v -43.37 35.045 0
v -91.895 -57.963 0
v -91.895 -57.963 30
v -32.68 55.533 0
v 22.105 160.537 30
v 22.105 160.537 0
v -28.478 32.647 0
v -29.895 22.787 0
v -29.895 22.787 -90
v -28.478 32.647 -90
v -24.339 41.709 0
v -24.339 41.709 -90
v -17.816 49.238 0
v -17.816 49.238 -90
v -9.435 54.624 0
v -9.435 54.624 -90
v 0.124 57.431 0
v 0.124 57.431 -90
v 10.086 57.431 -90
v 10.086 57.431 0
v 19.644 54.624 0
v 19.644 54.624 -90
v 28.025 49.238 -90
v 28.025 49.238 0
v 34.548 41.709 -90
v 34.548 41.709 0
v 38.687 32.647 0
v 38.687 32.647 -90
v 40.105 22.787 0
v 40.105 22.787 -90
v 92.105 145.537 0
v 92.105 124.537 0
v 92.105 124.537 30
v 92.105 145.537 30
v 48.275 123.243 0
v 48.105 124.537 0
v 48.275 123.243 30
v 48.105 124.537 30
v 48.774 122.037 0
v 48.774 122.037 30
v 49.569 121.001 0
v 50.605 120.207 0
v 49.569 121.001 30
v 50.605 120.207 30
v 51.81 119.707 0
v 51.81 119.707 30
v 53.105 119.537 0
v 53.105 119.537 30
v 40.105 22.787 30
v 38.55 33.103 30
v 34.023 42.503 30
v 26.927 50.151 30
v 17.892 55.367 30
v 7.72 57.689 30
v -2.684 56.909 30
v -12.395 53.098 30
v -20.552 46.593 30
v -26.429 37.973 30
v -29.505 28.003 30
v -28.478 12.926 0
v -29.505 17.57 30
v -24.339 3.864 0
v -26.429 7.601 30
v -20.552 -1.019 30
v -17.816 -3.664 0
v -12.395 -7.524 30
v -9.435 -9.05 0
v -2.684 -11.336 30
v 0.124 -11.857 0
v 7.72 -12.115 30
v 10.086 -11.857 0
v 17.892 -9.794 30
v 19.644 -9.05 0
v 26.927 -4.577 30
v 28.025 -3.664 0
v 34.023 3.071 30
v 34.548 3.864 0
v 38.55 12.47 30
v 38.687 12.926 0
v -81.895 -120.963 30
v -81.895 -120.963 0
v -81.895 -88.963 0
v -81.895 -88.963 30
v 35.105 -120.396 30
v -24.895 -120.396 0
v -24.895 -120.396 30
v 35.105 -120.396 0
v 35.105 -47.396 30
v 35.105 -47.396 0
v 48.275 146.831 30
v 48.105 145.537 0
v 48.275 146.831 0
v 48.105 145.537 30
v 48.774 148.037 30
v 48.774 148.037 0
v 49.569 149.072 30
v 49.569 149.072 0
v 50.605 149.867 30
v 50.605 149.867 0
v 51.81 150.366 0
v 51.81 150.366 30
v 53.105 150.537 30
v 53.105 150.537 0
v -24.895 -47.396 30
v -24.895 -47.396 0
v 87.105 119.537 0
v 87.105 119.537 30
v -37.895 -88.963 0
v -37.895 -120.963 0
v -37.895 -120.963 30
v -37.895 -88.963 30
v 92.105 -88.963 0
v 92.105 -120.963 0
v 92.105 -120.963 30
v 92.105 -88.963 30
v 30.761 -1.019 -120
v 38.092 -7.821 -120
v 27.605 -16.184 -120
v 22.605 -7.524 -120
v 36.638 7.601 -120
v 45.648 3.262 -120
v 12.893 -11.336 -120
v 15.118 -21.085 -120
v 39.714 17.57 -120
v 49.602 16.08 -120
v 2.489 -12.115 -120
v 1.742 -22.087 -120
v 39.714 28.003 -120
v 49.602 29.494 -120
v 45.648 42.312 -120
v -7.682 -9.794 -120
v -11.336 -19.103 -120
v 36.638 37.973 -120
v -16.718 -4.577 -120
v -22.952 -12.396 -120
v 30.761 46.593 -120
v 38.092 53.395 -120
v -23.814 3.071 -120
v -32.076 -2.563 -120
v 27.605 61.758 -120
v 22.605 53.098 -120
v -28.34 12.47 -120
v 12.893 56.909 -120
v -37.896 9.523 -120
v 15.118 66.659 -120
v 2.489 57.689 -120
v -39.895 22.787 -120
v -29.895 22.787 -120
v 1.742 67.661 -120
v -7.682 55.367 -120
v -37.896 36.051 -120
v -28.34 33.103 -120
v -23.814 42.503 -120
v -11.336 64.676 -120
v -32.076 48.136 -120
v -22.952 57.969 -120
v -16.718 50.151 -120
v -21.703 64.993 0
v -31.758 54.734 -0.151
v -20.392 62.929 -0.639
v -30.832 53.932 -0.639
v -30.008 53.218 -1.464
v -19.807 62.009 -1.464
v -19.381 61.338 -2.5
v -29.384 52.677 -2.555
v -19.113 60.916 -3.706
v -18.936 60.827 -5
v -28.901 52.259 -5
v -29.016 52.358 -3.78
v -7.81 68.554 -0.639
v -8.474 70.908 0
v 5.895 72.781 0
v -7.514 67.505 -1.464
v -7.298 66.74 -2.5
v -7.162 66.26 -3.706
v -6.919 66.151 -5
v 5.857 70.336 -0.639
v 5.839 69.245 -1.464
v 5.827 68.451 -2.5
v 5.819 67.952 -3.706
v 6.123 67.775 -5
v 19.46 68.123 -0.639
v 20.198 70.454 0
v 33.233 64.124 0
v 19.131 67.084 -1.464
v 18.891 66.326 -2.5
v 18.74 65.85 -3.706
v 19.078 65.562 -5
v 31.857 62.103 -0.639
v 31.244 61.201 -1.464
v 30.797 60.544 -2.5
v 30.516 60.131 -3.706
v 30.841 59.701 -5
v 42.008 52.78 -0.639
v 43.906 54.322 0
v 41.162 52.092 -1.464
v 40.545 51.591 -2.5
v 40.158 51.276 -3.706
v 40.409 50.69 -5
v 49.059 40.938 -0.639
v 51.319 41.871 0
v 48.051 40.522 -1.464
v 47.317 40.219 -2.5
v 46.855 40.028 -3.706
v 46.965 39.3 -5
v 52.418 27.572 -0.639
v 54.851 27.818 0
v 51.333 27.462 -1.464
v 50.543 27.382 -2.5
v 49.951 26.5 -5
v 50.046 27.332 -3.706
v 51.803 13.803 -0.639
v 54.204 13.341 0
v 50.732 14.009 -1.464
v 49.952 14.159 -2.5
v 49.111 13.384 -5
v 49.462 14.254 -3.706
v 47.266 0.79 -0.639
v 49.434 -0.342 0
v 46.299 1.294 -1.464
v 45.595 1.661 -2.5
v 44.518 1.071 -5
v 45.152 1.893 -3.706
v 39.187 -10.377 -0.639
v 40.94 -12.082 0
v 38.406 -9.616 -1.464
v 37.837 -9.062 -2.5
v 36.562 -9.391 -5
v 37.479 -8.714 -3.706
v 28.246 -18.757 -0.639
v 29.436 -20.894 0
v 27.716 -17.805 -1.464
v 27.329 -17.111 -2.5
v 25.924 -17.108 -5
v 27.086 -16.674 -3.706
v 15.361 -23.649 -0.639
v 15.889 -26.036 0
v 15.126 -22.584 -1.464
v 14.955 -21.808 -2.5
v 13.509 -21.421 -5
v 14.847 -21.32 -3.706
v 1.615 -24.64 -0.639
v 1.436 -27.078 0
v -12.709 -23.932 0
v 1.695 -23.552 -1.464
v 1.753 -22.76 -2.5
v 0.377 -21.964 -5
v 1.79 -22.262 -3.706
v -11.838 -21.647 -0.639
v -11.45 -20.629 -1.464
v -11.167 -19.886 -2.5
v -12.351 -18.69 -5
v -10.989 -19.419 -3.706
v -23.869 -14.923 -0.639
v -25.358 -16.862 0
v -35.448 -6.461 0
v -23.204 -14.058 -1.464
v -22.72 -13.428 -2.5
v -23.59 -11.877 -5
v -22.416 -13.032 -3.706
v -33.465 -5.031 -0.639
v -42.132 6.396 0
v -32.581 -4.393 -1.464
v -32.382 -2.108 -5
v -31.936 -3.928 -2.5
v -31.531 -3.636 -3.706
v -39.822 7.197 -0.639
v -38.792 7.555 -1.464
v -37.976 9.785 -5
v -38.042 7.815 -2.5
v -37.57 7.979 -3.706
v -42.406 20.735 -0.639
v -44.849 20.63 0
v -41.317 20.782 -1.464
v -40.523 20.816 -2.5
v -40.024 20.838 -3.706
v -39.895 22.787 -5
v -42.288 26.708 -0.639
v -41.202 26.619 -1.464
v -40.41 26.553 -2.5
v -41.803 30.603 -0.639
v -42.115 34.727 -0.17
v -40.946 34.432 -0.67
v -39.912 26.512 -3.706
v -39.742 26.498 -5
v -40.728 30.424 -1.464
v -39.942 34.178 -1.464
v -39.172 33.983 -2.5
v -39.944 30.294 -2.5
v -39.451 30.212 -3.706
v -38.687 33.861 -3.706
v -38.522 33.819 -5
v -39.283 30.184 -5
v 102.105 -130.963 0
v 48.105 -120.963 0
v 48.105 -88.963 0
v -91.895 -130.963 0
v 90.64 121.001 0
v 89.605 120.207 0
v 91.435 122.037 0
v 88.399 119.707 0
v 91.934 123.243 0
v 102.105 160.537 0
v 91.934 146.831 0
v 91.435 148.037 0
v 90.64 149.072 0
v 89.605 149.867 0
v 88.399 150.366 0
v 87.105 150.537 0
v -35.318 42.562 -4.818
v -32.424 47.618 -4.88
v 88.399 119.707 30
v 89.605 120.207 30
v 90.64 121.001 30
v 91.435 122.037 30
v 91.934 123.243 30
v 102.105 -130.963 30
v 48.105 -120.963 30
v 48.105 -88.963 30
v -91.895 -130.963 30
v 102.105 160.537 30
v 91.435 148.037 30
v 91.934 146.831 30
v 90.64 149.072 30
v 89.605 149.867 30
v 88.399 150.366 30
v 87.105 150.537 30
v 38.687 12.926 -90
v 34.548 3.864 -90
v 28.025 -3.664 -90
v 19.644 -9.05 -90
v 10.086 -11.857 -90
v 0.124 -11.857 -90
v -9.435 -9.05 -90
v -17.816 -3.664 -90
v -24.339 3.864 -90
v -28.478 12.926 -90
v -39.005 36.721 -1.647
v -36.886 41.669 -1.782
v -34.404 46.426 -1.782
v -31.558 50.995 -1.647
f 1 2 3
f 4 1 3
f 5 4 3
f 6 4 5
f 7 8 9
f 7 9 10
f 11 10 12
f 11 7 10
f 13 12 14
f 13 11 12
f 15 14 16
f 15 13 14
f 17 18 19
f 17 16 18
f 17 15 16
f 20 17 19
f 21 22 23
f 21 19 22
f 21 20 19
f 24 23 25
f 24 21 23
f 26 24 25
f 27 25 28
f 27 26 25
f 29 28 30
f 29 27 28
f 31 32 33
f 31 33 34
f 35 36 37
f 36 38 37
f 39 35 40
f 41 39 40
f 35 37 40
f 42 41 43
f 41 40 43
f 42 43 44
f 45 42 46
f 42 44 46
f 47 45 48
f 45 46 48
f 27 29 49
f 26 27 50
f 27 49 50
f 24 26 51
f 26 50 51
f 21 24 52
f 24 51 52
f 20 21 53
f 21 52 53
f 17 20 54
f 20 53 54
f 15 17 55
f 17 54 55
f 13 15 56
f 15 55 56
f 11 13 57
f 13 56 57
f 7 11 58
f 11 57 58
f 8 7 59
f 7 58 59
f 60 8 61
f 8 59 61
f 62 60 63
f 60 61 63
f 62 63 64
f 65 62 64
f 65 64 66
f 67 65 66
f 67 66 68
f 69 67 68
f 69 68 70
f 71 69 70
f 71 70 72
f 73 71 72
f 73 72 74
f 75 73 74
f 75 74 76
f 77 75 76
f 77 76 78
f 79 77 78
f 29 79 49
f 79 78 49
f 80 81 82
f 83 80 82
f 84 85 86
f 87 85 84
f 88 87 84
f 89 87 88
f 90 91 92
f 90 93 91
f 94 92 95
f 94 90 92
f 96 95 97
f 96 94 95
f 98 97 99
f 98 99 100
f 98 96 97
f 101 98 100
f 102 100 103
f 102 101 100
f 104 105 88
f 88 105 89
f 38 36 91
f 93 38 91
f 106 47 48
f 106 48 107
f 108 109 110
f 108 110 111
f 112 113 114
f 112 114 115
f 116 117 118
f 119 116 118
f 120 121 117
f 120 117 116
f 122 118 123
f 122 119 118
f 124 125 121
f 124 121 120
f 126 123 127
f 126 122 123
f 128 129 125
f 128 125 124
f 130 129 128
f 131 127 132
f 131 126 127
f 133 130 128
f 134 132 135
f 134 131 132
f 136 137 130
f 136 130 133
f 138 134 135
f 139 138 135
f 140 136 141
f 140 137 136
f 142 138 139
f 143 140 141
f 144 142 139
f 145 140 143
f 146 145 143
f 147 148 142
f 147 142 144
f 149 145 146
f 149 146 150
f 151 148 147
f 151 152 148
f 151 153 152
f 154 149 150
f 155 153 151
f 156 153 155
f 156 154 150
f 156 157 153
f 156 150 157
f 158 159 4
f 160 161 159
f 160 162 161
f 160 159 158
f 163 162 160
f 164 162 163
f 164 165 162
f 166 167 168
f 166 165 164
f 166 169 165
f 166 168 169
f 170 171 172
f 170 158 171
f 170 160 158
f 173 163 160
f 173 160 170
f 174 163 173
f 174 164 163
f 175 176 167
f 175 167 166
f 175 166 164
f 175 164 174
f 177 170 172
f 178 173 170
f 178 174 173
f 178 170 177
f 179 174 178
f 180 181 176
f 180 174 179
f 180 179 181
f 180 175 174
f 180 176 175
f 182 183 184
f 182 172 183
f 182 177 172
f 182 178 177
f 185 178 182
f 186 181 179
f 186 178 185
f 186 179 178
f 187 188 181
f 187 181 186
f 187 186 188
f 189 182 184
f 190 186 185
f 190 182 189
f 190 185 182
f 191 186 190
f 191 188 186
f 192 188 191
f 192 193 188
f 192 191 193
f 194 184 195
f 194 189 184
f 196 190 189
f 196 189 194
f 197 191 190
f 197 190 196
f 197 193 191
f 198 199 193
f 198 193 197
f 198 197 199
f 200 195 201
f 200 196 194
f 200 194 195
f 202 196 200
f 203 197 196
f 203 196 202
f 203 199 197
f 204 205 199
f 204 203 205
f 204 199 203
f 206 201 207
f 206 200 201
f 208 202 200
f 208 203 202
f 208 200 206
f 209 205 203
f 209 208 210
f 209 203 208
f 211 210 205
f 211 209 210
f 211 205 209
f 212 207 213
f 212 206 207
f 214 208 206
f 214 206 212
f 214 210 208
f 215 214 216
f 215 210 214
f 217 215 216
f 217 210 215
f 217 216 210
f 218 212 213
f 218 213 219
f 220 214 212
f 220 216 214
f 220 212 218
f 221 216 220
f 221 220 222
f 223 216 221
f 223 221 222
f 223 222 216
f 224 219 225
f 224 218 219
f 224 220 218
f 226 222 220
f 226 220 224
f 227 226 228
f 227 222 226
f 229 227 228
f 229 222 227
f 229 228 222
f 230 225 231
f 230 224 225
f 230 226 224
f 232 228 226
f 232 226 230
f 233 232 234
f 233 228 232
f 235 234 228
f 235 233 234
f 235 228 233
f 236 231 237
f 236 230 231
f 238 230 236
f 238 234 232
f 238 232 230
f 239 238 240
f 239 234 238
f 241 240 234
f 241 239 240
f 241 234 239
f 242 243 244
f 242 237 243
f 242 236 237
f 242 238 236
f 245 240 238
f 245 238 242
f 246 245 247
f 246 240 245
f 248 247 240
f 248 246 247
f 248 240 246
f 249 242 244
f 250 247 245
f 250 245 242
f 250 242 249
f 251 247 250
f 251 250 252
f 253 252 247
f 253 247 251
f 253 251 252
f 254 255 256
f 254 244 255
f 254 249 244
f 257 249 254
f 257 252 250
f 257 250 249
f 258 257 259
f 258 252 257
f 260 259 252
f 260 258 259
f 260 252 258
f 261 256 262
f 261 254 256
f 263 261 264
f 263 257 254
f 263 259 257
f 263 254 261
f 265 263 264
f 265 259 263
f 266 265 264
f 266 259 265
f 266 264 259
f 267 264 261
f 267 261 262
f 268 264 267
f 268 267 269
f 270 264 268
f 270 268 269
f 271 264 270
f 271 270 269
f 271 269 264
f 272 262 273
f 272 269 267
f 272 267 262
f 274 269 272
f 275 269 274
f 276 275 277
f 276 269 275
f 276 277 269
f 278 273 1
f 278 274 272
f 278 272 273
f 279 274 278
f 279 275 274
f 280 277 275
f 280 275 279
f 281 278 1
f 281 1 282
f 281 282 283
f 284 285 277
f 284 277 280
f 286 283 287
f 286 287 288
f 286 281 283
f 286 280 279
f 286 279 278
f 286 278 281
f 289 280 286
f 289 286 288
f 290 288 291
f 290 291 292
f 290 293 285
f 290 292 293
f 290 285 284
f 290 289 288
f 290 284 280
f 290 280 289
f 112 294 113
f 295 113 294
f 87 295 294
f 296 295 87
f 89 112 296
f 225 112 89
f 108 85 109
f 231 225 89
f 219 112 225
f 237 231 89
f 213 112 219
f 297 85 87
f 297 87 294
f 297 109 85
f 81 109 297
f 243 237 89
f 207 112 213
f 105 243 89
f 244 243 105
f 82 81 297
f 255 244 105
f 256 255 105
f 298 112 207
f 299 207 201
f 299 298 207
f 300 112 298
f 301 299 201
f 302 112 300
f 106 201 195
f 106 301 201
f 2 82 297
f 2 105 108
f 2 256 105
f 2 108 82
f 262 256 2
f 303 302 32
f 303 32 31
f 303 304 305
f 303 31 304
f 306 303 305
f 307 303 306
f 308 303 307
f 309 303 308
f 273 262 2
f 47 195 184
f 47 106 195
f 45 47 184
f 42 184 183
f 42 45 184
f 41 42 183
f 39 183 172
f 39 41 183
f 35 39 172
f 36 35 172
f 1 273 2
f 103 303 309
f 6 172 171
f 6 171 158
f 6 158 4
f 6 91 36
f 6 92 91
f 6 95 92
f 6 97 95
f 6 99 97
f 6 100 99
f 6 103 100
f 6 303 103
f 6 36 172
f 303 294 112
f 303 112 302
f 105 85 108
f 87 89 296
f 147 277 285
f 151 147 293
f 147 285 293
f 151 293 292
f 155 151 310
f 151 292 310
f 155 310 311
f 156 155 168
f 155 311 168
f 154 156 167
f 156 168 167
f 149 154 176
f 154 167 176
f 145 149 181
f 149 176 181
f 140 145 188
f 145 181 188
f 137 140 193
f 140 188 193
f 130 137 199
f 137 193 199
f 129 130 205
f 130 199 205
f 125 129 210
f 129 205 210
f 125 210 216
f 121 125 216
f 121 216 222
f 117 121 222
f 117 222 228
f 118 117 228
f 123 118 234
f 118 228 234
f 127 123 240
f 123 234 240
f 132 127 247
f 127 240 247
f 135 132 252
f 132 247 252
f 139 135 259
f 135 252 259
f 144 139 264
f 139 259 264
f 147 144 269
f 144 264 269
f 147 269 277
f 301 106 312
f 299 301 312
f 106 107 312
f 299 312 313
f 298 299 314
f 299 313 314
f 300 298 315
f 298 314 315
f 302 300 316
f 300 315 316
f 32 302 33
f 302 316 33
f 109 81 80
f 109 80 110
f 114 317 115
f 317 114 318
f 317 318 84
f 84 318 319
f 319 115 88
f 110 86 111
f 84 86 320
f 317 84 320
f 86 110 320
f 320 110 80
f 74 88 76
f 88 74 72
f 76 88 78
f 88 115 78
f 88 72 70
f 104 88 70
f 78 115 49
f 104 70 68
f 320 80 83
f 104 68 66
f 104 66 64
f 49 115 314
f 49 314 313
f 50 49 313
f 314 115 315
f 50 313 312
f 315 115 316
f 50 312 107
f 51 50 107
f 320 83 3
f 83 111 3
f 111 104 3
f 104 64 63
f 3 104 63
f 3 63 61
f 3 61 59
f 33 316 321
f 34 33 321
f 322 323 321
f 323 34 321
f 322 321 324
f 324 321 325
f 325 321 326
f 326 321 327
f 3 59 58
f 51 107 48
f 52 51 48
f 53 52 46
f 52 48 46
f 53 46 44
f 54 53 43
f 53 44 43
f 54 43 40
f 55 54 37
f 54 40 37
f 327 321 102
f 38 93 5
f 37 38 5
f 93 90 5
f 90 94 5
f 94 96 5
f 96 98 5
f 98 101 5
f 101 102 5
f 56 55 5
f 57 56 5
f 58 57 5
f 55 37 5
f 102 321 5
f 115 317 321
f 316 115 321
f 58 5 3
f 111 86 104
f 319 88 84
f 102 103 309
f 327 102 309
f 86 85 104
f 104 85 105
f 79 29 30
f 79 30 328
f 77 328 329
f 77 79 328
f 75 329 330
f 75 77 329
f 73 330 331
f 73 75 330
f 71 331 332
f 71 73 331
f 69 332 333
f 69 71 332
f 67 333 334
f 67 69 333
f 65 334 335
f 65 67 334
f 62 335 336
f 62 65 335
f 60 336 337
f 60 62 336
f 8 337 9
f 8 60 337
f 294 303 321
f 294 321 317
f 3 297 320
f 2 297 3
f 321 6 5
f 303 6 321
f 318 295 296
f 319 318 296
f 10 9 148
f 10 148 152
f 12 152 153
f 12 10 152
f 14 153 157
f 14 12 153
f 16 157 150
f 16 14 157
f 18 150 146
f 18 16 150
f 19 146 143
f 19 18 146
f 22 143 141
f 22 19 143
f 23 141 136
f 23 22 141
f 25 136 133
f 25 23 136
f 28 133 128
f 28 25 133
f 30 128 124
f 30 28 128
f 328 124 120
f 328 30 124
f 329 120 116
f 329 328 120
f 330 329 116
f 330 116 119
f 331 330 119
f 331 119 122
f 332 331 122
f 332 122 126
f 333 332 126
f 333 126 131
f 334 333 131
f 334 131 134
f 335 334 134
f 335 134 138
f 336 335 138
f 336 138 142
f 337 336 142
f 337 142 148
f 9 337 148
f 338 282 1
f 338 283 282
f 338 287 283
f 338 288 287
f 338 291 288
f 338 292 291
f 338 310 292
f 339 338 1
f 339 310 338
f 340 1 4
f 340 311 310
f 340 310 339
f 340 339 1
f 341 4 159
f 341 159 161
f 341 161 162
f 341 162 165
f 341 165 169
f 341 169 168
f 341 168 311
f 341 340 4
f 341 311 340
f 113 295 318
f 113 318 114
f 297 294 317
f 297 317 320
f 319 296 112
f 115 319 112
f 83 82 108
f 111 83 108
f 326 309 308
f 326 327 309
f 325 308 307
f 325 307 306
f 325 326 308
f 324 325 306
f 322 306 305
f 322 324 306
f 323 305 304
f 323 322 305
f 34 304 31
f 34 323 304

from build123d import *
from build123d.topology import SkipClean

# Parameters (mm, degrees)
SKETCH2_W           = 44
SKETCH2_H           = 31
SKETCH2_H_2         = 32
SKETCH2_W_2         = 60
SKETCH2_H_3         = 73
BOSS_EXTRUDE1_DEPTH = 30
SKETCH3_R           = 45
SKETCH3_R_2         = 35
BOSS_EXTRUDE2_DEPTH = 120
FILLET1_R           = 5
SKETCH6_R           = 35
CUT_EXTRUDE1_DEPTH  = 120
FILLET2_R           = 5


with BuildPart() as part:
    # Sketch2 → Boss-Extrude1 (new body)
    with BuildSketch(Plane.XY):
        Polygon((22.104569931, 160.536781585), (102.104569931, 160.536781585), (102.104569931, -130.963218415), (-91.895430069, -130.963218415), (-91.895430069, -57.963218415), align=None)
        with Locations((70.104569931, 135.036781585)):
            Rectangle(SKETCH2_W, SKETCH2_H, mode=Mode.SUBTRACT)
        with Locations((70.104569931, -104.963218415)):
            Rectangle(SKETCH2_W, SKETCH2_H_2, mode=Mode.SUBTRACT)
        with Locations((-59.895430069, -104.963218415)):
            Rectangle(SKETCH2_W, SKETCH2_H_2, mode=Mode.SUBTRACT)
        with Locations((5.104569931, -83.895986651)):
            Rectangle(SKETCH2_W_2, SKETCH2_H_3, mode=Mode.SUBTRACT)
    extrude(amount=BOSS_EXTRUDE1_DEPTH)

    # Sketch3 → Boss-Extrude2 (add)
    with BuildSketch(Plane(origin=(0, 0, 0), x_dir=(-1, 0, 0), z_dir=(0, 0, -1))):
        with Locations((-5.104569931, 22.786781585)):
            Circle(SKETCH3_R)
        with Locations((-5.104569931, 22.786781585)):
            Circle(SKETCH3_R_2, mode=Mode.SUBTRACT)
    extrude(amount=BOSS_EXTRUDE2_DEPTH)

    # Fillet1
    fillet1_edges = [part.edges().sort_by_distance(p)[0] for p in [
        (92.104569931, 119.536781585, 15),
        (92.104569931, 150.536781585, 15),
        (48.104569931, 150.536781585, 15),
        (48.104569931, 119.536781585, 15),
    ]]
    fillet(fillet1_edges, radius=FILLET1_R)

    # Sketch6 → Cut-Extrude1 (cut)
    with SkipClean():  # the faces are left unmerged after this step: merging them gives an invalid solid
        with BuildSketch(Plane.XY.offset(30)):
            with Locations((5.104569931, 22.786781585)):
                Circle(SKETCH6_R)
        extrude(amount=-CUT_EXTRUDE1_DEPTH, mode=Mode.SUBTRACT)
    add(part.part.scale(1), mode=Mode.REPLACE)  # the faces are merged on a copy

    # Fillet2
    fillet2_edges = [part.edges().sort_by_distance(p)[0] for p in [
        (50.104569931, 22.786781585, 0),
    ]]
    fillet(fillet2_edges, radius=FILLET2_R)


solid = part.part
